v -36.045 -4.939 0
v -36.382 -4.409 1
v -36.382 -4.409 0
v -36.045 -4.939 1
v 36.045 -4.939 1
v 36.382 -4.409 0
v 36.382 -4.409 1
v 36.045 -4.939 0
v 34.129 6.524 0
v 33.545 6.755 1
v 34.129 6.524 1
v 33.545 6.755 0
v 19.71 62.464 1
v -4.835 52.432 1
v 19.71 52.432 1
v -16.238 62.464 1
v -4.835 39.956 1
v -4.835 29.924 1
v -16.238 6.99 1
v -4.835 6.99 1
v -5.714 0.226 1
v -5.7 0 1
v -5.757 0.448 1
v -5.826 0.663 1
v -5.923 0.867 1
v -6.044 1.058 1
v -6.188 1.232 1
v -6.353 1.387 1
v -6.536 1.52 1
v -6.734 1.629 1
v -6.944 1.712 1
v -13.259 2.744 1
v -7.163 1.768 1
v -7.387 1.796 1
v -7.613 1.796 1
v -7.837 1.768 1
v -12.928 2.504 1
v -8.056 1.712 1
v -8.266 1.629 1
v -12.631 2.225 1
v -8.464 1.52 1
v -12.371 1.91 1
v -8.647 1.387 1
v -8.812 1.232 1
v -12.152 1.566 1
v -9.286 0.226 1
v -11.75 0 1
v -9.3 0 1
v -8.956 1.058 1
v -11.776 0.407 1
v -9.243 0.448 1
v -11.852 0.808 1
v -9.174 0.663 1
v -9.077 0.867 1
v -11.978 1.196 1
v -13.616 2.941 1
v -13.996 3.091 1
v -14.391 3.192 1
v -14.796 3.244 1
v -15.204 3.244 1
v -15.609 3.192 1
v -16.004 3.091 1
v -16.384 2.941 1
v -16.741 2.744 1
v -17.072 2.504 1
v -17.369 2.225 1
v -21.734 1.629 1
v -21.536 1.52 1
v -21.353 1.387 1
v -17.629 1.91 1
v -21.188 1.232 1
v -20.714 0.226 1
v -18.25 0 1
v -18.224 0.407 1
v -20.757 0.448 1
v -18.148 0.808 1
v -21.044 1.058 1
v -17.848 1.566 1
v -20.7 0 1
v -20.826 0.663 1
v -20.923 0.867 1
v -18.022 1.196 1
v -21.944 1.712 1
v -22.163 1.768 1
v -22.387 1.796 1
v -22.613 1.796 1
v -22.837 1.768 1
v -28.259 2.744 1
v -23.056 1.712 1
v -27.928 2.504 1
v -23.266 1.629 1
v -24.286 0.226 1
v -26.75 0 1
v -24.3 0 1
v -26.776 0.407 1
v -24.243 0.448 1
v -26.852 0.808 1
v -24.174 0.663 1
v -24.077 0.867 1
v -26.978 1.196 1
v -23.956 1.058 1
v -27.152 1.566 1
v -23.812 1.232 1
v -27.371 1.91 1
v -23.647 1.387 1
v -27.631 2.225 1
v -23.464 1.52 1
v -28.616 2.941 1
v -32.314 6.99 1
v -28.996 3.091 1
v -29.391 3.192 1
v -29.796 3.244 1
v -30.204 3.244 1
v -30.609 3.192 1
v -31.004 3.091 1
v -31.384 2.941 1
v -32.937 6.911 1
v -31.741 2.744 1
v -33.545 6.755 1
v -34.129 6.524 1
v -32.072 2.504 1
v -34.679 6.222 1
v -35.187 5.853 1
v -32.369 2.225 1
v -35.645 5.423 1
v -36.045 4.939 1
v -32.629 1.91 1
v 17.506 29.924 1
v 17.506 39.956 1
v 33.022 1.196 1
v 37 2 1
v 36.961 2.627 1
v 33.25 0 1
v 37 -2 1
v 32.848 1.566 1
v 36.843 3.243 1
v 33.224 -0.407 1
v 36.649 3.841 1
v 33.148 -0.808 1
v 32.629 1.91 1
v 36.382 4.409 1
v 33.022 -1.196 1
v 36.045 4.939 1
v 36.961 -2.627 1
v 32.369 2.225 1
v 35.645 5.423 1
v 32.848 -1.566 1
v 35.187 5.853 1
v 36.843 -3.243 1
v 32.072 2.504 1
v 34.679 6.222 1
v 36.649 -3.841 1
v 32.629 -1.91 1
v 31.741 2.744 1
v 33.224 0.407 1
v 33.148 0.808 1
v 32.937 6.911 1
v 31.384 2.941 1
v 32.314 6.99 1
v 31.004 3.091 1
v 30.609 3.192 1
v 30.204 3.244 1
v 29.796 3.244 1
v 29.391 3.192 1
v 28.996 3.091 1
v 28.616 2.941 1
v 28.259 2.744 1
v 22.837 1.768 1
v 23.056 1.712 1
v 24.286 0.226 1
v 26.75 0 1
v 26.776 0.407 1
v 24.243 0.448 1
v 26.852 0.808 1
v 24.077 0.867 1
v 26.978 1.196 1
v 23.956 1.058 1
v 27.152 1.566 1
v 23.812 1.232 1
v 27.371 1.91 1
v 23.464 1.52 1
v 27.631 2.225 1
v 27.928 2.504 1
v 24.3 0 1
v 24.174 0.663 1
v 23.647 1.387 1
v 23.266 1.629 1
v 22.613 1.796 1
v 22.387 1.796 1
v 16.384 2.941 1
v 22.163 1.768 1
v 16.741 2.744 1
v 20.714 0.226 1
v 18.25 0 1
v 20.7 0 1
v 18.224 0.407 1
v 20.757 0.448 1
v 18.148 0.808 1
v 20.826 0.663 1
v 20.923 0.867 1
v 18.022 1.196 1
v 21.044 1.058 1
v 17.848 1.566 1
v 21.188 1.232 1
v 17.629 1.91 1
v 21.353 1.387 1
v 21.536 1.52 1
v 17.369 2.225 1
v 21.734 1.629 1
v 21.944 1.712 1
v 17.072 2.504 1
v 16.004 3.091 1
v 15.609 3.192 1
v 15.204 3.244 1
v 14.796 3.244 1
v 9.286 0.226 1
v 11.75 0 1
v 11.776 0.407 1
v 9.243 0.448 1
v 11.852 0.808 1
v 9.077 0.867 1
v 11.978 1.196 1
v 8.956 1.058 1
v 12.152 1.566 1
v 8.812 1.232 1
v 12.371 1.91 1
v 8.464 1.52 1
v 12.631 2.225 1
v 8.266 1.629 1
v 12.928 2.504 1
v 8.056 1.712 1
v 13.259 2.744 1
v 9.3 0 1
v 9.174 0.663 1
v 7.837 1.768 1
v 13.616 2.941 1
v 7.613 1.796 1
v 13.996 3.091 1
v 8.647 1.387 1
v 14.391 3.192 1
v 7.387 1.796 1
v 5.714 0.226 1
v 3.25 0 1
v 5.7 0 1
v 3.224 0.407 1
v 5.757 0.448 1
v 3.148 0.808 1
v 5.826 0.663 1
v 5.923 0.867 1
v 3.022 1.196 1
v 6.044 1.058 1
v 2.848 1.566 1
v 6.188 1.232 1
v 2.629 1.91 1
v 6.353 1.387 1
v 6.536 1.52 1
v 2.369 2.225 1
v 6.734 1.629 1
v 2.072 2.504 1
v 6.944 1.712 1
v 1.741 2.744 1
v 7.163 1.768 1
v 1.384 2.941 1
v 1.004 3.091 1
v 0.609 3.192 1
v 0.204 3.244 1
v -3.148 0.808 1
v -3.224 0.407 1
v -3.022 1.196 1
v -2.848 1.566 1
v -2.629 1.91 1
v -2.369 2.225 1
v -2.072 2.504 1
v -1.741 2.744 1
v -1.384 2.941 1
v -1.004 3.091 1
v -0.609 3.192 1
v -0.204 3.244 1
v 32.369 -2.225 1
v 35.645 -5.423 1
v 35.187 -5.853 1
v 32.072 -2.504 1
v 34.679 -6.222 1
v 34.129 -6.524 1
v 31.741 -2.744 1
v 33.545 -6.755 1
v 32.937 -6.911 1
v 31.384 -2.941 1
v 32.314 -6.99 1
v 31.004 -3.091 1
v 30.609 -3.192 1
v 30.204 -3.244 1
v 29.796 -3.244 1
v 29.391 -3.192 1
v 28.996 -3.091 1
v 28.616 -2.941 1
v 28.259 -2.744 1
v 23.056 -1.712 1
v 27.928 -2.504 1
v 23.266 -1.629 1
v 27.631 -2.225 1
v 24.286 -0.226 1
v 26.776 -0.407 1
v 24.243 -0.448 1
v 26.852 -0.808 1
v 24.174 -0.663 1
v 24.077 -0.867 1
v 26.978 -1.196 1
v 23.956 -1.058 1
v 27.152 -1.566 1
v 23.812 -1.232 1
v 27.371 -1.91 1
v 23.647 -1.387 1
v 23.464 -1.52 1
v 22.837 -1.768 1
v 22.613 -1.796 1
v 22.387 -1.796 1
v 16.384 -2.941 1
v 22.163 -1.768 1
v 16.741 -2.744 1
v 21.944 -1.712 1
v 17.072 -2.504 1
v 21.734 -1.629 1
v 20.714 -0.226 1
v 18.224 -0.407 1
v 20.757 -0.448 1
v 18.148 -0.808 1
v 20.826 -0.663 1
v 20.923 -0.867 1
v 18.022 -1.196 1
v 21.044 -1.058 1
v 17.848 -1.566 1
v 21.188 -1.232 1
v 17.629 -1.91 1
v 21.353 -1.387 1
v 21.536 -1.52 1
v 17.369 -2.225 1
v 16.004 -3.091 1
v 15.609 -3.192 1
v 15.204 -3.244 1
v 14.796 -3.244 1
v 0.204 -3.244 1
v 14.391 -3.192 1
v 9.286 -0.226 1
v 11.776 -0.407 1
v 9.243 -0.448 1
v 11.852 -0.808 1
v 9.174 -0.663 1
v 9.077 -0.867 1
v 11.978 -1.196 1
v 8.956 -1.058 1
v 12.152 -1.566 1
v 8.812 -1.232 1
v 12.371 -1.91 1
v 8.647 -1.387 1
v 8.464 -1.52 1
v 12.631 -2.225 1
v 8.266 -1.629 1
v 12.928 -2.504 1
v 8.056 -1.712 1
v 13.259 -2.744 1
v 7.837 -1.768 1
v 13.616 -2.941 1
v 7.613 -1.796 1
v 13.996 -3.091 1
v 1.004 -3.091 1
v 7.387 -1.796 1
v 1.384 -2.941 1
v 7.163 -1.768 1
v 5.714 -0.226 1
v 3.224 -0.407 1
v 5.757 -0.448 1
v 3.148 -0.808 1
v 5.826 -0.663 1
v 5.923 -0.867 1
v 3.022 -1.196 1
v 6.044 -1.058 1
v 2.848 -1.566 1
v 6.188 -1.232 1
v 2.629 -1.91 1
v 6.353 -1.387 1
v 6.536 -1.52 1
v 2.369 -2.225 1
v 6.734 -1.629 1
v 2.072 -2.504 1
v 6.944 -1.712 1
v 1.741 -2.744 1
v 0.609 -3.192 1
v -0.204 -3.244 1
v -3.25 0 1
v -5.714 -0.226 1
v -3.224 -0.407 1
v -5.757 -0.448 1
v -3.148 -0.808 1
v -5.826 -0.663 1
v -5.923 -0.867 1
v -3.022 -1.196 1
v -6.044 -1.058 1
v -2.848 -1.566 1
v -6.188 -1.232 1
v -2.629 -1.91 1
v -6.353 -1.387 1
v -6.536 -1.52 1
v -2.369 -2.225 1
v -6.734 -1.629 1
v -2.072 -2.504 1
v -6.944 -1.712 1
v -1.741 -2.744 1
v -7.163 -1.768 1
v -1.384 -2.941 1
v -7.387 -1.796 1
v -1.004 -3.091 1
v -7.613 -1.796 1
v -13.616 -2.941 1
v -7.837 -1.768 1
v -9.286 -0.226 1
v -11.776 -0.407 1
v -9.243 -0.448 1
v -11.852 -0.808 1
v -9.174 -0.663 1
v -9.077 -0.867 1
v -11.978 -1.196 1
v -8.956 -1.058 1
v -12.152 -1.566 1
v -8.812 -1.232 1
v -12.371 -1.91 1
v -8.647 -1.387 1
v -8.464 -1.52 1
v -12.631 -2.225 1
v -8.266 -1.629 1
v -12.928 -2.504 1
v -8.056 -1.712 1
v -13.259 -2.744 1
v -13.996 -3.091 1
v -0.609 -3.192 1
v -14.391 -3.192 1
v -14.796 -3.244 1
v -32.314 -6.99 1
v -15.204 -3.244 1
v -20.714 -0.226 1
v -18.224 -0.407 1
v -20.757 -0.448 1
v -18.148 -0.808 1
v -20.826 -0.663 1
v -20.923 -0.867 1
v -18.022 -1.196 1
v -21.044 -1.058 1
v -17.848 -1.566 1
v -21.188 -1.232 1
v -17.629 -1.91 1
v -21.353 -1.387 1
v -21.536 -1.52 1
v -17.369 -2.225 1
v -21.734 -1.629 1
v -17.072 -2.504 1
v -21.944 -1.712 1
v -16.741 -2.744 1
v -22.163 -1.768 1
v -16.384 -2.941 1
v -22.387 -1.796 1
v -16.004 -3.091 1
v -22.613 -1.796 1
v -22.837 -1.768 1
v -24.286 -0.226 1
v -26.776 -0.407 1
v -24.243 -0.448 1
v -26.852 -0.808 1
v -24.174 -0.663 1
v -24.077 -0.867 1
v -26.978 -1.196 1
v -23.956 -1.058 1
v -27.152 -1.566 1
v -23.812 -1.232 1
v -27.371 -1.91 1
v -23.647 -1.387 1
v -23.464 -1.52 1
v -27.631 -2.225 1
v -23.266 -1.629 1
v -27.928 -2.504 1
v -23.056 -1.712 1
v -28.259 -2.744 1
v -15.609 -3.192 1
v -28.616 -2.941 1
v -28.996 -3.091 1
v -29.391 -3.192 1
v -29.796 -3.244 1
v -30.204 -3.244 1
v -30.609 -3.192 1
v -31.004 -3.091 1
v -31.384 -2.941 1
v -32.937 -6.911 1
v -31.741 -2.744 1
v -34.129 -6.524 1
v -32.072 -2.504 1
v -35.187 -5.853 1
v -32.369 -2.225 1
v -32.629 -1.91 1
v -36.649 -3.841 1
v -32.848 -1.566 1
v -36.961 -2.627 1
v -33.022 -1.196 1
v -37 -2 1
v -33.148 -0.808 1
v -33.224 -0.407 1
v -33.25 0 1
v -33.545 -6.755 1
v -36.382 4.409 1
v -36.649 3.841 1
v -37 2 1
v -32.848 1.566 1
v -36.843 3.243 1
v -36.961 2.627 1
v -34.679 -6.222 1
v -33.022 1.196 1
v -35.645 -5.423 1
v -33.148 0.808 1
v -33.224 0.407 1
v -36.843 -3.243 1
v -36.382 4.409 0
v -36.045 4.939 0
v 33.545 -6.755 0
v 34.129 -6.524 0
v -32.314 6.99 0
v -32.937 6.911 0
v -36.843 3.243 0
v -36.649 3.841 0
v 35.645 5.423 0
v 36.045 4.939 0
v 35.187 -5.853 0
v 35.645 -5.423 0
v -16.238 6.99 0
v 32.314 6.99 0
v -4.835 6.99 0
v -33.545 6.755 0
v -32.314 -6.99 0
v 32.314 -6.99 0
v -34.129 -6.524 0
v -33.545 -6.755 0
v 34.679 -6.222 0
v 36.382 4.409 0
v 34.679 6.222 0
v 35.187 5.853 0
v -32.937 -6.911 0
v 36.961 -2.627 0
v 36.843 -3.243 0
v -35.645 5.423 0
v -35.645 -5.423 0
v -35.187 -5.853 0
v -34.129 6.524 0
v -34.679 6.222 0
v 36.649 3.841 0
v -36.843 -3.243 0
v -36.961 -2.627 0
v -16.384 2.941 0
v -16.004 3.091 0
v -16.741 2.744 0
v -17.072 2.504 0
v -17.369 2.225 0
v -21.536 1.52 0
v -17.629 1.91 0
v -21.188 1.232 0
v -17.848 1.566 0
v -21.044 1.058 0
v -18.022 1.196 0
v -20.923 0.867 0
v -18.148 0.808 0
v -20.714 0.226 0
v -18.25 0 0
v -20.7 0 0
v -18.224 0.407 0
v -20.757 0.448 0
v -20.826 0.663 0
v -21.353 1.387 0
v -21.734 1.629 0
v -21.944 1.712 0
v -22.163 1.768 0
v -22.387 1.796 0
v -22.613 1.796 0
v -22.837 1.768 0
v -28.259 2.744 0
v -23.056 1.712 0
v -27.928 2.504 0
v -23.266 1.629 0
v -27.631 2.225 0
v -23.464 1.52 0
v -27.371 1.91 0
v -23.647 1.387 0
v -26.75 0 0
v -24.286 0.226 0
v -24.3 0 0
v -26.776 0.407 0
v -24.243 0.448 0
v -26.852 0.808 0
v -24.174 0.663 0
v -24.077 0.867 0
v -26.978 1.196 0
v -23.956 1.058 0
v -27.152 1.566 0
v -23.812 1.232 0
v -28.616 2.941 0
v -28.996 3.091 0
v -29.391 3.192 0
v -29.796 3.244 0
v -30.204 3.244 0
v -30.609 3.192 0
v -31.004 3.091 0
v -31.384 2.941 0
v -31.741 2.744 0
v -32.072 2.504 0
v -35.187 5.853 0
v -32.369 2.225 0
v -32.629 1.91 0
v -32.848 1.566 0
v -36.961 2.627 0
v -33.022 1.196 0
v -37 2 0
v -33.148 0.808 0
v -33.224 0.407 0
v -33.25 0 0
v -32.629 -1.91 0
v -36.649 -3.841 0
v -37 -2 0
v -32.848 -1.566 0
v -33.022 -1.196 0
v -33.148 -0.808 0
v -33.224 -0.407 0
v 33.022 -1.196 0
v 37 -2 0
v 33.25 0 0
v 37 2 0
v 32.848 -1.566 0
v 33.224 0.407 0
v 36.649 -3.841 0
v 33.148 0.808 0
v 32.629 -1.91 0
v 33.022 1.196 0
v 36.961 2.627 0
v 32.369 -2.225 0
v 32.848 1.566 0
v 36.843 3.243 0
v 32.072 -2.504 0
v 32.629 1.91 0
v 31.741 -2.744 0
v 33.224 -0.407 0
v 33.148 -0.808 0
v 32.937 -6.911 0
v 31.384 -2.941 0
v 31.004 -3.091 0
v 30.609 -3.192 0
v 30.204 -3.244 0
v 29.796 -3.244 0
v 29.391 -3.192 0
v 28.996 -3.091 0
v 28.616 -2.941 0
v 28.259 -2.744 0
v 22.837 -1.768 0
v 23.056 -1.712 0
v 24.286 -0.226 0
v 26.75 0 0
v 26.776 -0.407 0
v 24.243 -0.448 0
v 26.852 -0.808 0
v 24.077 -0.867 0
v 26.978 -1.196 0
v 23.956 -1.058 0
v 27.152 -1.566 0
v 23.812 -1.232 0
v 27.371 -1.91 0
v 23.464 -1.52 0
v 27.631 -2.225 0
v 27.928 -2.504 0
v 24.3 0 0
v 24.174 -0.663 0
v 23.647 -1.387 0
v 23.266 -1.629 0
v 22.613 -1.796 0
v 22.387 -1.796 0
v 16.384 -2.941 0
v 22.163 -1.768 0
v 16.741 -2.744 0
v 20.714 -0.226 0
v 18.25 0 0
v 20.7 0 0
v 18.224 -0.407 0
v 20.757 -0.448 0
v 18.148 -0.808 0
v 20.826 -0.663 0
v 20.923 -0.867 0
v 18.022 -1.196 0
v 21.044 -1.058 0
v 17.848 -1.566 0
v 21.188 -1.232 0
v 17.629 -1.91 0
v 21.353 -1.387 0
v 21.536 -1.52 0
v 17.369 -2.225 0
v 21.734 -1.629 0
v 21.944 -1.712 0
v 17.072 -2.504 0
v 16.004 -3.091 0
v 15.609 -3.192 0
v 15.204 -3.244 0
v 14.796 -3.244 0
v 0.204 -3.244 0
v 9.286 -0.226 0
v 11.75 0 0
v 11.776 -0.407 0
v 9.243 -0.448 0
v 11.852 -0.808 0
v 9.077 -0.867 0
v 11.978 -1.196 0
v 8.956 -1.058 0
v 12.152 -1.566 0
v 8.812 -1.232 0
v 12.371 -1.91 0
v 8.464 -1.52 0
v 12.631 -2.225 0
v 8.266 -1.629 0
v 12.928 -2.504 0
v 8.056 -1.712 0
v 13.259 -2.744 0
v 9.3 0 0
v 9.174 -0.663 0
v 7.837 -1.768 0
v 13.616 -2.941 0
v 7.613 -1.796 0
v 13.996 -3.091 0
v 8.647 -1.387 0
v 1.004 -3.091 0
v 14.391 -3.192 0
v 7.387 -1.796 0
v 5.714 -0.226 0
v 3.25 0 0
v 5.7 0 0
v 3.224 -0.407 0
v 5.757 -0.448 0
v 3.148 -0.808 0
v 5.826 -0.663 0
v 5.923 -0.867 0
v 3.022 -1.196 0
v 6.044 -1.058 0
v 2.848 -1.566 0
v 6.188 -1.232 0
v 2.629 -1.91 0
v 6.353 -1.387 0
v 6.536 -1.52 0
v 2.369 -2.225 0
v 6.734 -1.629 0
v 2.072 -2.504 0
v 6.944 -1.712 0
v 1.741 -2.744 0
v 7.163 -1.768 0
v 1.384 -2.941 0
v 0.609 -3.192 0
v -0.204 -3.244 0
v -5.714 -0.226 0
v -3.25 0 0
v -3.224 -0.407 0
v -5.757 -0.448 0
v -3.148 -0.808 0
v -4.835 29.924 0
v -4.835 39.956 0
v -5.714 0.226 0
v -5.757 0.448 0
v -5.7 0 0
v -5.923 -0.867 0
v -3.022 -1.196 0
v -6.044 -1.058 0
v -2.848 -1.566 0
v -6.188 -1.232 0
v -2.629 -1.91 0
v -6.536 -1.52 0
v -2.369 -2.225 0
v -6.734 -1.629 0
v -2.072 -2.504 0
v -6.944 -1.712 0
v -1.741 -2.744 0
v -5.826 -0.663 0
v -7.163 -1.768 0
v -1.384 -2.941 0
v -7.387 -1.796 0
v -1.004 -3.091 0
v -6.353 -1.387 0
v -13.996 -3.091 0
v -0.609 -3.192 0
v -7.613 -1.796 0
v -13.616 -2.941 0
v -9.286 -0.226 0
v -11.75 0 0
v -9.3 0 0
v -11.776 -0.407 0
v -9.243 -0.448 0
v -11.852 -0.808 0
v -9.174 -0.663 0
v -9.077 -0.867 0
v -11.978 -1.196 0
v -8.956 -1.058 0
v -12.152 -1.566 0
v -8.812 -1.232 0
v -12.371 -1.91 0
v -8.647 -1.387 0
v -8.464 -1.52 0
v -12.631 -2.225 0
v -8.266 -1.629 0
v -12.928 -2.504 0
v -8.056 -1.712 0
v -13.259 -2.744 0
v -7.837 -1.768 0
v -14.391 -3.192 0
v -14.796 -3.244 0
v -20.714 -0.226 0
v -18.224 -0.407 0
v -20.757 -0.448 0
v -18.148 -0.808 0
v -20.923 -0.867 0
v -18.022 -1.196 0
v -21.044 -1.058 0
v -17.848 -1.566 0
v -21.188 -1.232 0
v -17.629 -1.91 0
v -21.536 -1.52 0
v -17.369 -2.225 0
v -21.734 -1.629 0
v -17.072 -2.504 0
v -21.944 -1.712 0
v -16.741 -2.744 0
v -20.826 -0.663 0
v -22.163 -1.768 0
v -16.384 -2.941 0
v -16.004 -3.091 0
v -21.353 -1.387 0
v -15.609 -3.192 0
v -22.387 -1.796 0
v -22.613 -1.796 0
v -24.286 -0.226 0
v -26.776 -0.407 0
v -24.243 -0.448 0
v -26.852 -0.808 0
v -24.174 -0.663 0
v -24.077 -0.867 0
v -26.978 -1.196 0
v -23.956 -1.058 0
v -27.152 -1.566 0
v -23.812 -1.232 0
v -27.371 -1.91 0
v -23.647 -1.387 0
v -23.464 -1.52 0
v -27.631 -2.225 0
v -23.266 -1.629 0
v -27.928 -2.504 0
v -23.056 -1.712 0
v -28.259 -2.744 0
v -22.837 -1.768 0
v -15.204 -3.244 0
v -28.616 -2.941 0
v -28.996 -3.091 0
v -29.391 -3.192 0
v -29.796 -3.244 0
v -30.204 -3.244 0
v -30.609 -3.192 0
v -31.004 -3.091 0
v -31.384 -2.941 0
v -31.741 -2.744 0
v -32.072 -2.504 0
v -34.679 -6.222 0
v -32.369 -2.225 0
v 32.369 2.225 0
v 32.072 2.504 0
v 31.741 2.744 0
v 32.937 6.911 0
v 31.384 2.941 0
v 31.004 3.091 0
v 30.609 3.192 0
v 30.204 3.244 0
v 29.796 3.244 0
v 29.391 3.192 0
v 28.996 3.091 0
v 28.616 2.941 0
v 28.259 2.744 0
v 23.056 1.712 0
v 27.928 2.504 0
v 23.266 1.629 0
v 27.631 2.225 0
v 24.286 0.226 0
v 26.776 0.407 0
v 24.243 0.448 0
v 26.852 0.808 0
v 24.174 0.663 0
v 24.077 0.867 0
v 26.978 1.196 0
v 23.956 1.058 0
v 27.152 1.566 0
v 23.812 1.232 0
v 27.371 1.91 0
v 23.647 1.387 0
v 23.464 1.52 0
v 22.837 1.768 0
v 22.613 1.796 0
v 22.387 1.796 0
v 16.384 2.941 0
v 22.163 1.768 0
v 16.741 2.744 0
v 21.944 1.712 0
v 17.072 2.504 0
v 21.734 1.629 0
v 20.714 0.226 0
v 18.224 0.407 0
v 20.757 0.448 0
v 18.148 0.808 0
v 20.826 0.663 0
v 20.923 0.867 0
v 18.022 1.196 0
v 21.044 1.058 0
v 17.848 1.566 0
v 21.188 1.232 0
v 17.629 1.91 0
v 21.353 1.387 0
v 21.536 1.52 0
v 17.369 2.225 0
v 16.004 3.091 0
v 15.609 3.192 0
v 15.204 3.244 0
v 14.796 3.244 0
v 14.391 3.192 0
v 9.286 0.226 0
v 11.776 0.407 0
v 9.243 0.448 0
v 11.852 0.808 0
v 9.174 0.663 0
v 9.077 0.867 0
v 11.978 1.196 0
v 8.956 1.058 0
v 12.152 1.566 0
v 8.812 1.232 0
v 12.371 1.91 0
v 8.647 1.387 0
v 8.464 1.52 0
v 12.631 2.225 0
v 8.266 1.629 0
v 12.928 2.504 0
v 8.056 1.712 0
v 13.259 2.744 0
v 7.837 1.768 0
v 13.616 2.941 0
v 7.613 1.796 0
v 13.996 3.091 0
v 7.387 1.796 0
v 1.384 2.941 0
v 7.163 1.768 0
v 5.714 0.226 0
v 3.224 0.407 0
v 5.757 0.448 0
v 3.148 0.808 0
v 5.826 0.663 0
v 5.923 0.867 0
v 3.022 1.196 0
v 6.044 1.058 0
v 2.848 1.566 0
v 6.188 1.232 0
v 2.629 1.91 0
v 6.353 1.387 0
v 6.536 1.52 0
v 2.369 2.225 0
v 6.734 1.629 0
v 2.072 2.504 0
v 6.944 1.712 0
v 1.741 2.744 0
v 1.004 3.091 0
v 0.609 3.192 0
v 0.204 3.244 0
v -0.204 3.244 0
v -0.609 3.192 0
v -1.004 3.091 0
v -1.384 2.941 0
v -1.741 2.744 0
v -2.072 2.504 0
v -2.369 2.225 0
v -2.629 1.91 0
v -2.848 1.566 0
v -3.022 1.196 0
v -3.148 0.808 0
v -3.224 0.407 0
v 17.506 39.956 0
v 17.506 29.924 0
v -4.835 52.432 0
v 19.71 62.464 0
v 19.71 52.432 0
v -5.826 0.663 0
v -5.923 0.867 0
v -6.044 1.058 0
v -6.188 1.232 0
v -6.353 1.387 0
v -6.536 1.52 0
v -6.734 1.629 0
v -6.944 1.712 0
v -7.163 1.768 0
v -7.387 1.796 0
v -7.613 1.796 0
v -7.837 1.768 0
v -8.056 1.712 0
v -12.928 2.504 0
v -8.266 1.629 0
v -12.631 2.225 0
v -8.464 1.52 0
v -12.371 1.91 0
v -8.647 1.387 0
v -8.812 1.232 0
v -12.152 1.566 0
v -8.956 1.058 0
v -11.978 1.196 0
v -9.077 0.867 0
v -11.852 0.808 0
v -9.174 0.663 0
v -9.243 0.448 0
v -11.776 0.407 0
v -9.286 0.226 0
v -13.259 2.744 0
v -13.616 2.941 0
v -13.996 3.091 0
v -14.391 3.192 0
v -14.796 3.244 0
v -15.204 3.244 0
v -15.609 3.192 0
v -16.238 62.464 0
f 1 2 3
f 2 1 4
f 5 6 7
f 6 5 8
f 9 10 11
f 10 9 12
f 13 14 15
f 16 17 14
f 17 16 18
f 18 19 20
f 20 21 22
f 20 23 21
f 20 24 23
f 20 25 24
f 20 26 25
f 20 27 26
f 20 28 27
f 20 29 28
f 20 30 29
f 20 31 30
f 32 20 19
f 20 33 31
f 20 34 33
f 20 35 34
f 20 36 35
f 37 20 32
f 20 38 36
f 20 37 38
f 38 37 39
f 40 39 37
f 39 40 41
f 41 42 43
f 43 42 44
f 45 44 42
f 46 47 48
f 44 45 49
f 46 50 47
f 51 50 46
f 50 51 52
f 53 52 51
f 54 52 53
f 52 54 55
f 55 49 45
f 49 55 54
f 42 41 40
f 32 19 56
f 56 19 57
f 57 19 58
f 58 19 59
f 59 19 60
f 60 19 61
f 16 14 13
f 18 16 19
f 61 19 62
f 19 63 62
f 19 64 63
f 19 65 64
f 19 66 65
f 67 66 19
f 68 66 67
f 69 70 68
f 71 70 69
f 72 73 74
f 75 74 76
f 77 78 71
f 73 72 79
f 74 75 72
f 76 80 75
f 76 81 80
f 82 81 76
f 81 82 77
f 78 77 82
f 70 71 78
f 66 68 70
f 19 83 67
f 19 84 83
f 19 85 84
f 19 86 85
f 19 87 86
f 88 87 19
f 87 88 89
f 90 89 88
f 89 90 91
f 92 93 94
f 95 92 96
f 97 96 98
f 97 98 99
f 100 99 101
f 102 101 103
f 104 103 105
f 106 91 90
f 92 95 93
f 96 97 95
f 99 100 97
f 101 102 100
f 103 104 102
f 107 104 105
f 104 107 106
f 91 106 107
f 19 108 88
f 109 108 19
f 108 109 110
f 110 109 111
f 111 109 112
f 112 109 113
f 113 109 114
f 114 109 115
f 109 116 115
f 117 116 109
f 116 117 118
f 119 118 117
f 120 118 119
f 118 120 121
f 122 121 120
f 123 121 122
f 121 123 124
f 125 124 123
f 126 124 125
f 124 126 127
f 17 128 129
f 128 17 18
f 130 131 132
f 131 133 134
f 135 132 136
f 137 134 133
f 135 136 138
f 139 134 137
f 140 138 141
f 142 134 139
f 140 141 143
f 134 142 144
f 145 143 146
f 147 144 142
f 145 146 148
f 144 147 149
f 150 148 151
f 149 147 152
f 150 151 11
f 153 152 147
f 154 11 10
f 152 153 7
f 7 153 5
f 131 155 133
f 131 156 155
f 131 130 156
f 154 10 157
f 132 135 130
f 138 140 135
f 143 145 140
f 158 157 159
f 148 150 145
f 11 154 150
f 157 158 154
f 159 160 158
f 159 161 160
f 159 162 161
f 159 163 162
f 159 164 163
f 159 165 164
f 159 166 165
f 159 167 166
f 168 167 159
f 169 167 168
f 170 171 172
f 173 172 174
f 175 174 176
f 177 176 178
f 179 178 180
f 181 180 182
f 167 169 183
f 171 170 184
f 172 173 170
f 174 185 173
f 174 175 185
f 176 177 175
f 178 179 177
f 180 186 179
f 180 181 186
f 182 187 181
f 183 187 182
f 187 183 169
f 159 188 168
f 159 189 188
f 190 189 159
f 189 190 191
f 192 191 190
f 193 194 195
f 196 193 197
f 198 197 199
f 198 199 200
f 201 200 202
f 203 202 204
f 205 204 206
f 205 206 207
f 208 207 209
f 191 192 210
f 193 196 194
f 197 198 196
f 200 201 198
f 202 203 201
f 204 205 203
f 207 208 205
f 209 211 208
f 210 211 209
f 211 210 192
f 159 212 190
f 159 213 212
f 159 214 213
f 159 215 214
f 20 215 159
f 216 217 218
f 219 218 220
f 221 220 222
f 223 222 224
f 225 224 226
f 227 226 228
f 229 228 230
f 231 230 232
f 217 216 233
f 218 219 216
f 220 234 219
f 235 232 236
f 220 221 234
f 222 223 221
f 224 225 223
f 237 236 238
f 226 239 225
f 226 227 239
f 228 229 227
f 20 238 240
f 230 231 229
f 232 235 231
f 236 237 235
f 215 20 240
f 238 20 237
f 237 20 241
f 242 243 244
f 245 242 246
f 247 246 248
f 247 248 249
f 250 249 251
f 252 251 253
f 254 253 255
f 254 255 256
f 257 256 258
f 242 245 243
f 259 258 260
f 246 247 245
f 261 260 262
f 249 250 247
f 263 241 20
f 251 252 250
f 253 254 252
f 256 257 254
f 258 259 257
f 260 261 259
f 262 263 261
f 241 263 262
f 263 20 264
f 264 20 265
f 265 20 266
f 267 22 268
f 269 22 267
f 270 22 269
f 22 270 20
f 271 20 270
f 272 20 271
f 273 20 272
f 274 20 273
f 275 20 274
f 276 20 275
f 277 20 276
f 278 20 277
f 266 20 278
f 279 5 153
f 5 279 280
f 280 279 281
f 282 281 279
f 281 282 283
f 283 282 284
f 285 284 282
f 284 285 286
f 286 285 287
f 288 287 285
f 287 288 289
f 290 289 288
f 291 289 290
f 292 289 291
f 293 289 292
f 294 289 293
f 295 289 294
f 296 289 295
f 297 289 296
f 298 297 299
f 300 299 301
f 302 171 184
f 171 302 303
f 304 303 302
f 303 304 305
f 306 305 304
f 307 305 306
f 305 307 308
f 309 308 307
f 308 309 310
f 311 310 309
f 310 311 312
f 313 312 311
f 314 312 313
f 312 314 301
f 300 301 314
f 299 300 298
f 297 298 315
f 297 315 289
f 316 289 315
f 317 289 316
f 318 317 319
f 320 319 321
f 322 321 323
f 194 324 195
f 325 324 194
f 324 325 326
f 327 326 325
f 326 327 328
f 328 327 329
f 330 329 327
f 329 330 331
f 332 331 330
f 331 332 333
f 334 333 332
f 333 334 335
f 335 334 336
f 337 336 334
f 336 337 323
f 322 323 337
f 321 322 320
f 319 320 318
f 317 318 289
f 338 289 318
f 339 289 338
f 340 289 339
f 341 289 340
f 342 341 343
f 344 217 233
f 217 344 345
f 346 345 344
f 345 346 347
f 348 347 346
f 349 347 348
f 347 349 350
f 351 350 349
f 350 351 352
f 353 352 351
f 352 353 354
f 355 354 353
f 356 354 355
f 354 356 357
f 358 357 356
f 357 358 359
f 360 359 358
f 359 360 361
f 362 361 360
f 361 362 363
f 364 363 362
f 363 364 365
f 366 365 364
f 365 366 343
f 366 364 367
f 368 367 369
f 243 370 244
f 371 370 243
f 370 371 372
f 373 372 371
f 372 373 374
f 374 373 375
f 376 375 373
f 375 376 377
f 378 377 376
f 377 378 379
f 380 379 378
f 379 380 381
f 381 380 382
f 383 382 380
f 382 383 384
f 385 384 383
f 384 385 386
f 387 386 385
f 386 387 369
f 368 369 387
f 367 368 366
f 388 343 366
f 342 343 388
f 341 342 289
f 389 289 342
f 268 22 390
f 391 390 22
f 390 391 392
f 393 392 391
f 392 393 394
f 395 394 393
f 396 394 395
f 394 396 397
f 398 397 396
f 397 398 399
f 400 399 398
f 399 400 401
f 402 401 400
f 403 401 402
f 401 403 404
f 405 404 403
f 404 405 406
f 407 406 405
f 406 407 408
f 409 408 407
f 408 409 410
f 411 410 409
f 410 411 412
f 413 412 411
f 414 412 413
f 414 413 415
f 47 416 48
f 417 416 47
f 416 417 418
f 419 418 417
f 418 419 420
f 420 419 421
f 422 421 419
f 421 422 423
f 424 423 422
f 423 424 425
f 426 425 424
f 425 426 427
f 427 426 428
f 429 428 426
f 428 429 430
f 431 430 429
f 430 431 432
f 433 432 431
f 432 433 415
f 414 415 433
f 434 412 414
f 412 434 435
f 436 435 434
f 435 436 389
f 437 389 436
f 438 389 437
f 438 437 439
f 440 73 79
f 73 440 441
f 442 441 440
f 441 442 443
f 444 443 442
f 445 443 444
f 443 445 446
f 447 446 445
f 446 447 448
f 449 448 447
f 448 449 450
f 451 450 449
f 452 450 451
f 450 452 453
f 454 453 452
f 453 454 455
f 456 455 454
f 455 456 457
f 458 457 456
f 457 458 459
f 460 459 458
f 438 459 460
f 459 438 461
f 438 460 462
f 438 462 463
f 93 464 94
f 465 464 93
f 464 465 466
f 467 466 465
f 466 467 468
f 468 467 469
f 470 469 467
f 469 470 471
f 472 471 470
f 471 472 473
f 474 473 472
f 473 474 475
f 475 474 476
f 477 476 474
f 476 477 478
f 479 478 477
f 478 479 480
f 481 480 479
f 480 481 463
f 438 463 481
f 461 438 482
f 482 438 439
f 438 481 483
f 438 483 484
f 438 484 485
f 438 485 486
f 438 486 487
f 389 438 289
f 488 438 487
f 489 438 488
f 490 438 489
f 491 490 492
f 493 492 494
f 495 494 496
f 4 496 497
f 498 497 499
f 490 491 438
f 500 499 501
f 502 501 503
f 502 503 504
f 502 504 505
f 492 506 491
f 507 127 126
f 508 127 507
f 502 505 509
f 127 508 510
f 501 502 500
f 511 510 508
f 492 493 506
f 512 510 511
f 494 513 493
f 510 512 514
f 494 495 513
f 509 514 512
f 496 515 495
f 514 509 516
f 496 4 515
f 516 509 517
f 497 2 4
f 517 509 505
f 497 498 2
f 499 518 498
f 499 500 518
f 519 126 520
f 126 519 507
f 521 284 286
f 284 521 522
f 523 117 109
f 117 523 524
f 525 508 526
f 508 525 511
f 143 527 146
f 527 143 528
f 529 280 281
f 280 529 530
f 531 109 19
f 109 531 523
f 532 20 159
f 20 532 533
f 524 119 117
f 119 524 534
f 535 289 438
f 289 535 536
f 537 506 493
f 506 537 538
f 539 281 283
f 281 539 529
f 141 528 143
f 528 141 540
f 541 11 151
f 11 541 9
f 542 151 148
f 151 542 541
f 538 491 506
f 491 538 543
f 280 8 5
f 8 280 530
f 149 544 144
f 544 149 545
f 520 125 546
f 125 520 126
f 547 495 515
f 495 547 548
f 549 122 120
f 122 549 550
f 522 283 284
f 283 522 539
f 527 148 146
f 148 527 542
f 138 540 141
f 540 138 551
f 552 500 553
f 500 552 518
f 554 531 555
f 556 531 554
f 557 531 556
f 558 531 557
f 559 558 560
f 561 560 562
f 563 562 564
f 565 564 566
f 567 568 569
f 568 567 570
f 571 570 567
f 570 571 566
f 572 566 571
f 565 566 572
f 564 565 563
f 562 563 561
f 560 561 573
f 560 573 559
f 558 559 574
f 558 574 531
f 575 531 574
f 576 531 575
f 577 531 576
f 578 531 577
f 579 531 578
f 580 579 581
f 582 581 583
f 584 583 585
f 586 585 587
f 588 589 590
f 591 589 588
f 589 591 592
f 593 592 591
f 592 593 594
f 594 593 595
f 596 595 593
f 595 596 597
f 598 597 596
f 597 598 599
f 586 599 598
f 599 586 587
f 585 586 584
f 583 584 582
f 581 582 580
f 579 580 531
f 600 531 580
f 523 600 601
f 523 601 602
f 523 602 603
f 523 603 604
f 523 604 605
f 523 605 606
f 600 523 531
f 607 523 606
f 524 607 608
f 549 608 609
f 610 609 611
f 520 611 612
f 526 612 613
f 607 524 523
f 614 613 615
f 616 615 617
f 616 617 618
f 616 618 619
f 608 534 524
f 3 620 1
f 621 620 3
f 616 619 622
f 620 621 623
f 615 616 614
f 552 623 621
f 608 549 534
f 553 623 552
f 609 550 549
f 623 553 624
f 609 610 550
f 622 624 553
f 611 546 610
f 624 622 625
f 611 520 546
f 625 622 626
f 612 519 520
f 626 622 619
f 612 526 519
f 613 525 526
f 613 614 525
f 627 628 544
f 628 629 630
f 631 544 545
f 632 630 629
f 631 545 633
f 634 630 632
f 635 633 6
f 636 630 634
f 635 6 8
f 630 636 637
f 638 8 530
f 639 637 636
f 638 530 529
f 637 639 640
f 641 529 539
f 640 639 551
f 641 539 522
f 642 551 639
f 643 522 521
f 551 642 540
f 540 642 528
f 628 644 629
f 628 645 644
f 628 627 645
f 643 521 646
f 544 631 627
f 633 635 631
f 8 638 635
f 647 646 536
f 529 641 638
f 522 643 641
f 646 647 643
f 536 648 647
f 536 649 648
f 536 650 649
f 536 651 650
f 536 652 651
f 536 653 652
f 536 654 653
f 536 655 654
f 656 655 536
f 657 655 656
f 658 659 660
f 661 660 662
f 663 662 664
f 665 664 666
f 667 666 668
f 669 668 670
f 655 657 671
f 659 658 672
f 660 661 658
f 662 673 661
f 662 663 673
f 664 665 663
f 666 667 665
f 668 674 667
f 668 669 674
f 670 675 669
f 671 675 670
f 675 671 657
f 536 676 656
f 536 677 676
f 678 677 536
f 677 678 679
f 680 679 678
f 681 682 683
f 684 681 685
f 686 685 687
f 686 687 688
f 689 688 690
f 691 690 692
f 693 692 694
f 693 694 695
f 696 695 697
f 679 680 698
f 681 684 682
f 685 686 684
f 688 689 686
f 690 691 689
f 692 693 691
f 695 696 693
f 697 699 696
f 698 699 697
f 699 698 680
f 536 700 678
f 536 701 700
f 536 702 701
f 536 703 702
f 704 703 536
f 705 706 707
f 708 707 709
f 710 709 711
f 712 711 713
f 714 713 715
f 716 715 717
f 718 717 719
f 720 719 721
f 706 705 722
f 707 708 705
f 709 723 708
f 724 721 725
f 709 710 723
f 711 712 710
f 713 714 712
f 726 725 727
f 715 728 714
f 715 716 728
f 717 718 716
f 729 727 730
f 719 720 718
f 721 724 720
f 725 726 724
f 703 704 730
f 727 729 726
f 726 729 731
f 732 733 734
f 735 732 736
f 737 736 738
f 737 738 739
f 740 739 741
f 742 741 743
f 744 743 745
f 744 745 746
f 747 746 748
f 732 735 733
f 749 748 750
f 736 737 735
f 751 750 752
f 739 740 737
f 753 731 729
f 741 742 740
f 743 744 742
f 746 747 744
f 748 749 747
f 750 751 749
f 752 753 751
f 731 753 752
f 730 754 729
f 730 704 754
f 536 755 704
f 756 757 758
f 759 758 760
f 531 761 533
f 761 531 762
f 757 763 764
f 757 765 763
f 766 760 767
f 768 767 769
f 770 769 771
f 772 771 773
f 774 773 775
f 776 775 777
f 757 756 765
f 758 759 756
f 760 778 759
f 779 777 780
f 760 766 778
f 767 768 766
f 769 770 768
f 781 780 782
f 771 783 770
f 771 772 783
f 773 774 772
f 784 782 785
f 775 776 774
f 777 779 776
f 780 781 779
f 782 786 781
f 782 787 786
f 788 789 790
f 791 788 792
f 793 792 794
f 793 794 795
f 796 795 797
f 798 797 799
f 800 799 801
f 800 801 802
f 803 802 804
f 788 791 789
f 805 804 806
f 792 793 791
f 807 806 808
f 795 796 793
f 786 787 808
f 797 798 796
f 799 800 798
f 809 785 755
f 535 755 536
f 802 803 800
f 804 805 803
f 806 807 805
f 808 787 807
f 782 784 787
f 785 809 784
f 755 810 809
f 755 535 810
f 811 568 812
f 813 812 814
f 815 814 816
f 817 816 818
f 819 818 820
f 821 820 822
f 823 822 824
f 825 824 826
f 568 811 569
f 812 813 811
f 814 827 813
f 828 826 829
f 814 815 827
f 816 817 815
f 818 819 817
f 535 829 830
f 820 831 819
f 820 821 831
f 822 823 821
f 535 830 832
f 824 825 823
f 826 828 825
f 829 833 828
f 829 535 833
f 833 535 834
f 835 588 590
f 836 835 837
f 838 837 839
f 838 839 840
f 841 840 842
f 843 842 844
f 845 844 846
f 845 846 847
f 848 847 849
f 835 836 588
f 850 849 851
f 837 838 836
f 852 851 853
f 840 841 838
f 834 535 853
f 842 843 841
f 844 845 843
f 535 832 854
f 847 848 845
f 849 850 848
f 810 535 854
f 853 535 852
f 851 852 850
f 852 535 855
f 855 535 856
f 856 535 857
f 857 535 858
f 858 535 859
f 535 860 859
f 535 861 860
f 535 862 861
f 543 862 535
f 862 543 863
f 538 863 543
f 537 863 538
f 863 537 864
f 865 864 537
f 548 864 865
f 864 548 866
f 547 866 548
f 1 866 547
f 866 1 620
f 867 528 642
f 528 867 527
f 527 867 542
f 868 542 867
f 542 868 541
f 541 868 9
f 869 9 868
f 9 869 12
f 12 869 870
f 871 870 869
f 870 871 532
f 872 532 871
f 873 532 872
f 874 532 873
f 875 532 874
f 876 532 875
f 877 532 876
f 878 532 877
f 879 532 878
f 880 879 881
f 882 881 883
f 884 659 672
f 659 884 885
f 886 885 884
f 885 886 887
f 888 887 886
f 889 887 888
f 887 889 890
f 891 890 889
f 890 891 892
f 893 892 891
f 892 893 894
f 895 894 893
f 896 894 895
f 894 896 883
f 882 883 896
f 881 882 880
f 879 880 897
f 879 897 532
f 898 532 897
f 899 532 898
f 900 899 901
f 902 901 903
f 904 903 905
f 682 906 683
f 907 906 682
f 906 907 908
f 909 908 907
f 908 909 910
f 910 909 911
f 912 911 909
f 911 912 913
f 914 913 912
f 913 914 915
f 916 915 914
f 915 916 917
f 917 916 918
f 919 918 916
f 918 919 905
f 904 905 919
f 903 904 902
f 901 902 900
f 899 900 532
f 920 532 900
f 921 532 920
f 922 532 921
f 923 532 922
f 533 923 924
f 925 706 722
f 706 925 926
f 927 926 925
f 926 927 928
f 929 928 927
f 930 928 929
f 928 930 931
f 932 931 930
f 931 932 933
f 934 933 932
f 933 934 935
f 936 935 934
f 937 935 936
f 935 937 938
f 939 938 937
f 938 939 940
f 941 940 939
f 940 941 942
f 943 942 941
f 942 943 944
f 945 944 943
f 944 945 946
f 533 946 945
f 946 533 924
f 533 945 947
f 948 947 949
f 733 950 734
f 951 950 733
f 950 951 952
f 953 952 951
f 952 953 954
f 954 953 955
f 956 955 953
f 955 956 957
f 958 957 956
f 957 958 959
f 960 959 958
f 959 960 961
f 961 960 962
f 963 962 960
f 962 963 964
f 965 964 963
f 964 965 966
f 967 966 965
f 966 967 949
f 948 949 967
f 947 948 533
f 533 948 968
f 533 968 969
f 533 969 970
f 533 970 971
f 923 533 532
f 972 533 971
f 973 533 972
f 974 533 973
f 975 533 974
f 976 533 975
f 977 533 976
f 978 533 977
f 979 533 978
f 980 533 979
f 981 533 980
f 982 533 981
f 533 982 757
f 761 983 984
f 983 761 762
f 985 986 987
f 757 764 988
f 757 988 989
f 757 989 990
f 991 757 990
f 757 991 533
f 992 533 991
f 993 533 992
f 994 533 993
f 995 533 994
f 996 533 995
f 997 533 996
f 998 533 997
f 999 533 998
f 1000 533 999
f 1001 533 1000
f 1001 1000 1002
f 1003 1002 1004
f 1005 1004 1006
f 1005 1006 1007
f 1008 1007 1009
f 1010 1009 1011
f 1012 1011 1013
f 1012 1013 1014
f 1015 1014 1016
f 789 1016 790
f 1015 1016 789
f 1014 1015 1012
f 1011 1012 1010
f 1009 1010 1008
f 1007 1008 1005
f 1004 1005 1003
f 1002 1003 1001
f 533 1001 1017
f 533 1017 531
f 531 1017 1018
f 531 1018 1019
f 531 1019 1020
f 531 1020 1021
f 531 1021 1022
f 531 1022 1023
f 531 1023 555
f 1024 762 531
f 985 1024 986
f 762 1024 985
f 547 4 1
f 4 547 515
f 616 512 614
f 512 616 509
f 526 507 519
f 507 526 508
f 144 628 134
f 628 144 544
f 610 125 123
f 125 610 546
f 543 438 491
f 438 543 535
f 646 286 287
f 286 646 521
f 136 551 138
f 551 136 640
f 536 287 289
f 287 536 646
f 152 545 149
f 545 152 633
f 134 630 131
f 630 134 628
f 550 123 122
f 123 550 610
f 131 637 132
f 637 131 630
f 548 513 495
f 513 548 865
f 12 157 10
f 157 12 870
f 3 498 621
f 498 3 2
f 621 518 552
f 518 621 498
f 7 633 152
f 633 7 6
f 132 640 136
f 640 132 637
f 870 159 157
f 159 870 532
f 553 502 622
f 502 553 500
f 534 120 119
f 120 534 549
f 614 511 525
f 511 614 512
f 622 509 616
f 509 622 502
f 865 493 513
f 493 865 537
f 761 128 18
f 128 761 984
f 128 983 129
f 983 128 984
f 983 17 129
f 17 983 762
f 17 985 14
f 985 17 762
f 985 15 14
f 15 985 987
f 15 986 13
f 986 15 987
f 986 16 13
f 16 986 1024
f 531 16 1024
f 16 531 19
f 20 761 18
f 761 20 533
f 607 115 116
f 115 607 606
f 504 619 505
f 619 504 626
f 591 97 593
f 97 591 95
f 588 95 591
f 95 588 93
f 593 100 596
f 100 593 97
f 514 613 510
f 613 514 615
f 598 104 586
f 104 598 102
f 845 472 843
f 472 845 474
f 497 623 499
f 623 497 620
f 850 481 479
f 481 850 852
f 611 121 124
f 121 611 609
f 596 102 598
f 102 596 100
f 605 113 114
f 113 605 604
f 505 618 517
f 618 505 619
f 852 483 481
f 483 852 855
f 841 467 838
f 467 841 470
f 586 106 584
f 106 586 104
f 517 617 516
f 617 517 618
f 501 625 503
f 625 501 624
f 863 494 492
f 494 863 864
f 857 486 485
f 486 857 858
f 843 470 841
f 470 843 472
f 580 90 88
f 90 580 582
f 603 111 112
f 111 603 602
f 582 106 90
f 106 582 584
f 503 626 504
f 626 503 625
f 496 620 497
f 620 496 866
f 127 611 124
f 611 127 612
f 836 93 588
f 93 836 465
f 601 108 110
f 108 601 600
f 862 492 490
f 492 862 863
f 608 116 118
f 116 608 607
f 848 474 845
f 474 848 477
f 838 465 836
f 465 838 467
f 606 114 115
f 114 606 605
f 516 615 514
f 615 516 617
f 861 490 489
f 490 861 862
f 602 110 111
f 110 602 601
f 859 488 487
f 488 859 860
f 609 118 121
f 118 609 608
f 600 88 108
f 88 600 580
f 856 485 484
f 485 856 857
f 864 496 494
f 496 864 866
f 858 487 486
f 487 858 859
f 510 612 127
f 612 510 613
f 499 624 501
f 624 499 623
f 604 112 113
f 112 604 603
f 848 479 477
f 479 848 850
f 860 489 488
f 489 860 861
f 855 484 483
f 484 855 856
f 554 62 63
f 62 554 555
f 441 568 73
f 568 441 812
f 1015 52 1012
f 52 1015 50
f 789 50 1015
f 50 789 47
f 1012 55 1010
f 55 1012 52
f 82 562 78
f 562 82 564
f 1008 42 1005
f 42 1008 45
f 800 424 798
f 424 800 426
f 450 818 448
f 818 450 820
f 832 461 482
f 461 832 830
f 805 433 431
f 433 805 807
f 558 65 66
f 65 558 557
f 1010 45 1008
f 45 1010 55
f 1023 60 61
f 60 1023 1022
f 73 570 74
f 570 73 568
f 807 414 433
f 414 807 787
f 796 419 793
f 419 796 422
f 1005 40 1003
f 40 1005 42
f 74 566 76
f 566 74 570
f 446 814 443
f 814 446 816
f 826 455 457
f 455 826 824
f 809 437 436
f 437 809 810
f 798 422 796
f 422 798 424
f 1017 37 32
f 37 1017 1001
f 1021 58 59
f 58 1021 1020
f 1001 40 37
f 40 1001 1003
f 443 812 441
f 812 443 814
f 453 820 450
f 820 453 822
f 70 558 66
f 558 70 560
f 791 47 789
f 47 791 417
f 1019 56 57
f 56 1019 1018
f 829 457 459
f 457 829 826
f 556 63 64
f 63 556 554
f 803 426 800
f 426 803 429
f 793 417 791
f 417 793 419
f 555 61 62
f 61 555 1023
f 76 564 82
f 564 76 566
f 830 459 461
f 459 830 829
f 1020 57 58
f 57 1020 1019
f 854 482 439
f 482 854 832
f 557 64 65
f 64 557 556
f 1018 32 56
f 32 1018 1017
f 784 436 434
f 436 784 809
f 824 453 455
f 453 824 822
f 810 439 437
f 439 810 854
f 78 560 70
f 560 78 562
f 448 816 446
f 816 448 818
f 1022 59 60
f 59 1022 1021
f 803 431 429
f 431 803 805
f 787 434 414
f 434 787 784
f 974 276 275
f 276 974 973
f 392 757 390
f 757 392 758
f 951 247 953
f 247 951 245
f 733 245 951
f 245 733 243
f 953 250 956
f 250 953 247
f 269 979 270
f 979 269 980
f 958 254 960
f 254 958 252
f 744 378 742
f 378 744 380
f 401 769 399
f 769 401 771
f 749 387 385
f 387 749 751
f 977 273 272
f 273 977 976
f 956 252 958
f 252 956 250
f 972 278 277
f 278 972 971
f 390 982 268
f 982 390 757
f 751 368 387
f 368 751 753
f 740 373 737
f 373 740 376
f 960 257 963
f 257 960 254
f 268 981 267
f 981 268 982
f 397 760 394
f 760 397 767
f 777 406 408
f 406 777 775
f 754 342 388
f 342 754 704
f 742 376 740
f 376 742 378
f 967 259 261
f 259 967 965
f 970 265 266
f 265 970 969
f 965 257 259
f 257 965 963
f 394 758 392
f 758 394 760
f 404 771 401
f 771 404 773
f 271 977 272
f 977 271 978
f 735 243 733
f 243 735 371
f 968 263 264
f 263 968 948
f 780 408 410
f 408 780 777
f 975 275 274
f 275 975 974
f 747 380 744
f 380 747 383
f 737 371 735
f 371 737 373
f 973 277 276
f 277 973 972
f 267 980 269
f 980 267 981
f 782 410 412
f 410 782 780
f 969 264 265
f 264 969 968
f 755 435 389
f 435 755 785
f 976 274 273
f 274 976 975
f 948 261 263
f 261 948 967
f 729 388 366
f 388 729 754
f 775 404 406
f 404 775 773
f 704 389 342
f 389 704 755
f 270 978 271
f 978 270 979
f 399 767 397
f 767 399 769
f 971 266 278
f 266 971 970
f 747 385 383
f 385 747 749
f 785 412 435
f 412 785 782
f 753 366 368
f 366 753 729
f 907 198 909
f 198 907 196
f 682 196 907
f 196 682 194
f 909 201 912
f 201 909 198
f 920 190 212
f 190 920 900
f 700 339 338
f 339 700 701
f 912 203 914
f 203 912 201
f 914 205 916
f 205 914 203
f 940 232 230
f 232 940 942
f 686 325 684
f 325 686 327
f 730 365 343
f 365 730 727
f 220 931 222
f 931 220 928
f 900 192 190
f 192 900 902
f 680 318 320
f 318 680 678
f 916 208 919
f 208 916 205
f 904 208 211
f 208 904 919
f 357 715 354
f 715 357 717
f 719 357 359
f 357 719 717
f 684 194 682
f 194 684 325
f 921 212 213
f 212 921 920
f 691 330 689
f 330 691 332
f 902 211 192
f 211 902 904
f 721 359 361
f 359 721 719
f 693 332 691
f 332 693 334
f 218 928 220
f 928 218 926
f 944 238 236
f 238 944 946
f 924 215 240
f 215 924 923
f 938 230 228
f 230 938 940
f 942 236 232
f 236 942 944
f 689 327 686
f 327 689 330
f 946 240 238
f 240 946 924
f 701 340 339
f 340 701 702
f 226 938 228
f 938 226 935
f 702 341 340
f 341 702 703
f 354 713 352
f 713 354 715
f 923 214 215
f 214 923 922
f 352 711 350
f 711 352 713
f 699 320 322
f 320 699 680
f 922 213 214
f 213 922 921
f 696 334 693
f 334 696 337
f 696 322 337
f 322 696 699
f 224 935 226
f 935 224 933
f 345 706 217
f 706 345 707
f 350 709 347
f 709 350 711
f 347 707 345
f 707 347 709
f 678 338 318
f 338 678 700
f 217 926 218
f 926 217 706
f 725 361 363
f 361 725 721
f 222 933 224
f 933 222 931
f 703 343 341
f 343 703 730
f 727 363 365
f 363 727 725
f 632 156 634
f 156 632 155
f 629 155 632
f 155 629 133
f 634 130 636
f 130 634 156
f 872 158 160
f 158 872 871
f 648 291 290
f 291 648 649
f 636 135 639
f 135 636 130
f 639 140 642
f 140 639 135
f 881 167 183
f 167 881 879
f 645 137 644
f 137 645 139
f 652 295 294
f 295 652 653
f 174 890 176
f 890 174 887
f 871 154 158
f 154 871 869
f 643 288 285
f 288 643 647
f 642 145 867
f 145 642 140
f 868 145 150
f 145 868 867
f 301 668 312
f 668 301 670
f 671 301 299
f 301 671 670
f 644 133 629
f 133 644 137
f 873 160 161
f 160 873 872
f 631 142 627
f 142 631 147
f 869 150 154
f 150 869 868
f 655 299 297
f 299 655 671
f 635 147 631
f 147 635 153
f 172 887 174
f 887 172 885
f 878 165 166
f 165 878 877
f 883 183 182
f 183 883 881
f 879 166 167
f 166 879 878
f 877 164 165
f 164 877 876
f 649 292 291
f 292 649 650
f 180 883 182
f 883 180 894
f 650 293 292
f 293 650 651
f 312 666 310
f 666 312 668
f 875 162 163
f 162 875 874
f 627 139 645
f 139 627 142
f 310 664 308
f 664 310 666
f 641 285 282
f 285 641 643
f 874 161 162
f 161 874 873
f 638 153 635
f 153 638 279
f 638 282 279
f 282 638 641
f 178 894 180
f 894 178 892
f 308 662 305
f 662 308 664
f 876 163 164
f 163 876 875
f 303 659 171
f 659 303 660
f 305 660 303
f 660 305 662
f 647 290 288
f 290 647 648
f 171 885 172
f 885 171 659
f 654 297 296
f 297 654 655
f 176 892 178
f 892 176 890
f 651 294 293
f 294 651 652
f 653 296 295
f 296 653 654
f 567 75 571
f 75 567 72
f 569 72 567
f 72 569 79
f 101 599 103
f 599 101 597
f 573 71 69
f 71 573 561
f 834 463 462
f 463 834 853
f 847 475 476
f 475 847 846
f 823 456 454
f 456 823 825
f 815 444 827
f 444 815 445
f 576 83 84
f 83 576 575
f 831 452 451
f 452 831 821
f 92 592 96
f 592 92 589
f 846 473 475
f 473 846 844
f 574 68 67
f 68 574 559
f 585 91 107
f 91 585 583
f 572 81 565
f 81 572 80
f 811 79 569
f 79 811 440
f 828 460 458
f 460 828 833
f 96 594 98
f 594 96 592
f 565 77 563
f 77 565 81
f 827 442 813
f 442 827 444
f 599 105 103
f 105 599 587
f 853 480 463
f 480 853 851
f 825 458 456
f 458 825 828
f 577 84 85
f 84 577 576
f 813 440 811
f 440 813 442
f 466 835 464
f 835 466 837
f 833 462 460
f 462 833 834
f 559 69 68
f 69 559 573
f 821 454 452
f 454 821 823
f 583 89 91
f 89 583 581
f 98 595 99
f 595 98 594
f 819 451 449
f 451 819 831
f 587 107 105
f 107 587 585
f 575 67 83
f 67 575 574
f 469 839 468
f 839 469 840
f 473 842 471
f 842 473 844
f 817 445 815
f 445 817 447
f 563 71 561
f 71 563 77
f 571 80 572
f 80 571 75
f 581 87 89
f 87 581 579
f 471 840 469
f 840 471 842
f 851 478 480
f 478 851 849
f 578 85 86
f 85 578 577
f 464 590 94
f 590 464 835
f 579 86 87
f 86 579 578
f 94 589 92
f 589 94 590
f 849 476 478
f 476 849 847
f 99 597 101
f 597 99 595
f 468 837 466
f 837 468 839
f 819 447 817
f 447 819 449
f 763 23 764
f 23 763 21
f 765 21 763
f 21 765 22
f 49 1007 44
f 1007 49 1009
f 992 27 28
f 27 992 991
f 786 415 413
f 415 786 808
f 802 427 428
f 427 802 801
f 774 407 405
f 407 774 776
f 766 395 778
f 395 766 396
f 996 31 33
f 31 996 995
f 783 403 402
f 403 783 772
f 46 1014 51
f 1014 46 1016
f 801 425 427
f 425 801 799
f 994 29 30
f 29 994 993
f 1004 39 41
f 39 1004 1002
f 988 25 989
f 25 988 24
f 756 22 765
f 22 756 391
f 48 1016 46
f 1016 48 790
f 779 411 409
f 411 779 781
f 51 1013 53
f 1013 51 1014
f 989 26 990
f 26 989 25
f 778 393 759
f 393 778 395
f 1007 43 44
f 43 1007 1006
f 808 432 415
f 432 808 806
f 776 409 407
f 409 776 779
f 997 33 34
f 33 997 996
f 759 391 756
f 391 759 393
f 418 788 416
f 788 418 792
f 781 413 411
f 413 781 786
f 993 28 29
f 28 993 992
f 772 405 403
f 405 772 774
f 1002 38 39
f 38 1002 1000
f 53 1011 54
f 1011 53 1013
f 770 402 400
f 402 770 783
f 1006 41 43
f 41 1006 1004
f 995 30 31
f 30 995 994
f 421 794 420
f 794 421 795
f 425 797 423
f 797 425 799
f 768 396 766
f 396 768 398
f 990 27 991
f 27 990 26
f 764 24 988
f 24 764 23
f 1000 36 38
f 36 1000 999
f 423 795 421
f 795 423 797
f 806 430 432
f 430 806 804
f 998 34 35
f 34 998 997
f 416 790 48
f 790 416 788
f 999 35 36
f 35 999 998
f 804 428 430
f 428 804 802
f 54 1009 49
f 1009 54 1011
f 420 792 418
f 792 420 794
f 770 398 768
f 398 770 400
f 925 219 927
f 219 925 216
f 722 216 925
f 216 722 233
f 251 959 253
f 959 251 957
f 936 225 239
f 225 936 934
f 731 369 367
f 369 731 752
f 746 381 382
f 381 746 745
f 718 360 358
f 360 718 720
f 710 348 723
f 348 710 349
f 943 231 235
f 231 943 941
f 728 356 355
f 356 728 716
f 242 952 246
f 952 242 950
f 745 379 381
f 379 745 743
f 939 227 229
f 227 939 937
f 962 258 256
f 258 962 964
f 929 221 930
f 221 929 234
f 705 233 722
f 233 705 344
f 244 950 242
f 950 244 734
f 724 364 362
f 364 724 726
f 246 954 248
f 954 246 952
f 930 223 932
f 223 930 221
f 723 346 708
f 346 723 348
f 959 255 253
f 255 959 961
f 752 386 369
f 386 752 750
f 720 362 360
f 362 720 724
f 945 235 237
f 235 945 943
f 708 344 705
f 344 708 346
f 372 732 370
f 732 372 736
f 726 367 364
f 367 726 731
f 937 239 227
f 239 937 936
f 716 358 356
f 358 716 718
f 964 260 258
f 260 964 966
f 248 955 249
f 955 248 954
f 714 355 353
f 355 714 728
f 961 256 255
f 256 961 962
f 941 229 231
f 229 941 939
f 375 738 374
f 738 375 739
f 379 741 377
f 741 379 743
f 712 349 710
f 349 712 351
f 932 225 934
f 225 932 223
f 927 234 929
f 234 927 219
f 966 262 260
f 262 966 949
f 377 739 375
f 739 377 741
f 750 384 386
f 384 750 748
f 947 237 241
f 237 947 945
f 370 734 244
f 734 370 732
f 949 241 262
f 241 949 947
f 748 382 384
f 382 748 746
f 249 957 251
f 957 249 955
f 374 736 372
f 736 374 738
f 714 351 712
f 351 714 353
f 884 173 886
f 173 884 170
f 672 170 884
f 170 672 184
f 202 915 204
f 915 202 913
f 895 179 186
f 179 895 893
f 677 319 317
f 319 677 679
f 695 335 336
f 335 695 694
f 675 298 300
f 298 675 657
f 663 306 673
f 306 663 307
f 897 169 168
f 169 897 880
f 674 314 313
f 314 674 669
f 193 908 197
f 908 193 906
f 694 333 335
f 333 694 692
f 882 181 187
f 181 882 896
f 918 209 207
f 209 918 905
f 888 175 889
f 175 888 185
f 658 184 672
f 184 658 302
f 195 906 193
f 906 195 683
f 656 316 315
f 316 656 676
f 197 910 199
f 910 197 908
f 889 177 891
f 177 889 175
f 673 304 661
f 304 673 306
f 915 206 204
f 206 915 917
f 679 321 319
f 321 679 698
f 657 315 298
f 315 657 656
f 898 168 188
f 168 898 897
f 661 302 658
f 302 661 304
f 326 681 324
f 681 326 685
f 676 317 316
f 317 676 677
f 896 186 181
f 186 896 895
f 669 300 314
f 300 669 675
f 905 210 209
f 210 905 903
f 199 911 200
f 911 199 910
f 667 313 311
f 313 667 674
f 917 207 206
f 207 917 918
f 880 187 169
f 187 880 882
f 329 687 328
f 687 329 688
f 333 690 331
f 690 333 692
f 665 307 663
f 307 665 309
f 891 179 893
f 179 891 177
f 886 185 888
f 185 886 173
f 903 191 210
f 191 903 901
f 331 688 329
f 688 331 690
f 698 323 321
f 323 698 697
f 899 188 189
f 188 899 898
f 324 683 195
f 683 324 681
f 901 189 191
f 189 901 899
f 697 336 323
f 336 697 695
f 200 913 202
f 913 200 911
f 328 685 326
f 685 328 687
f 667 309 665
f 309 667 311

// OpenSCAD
$fn = 50;


difference() {
	union() {
		hull() {
			translate(v = [-32.0000000000, 2.0000000000, 0]) {
				cylinder(h = 1, r = 5);
			}
			translate(v = [32.0000000000, 2.0000000000, 0]) {
				cylinder(h = 1, r = 5);
			}
			translate(v = [-32.0000000000, -2.0000000000, 0]) {
				cylinder(h = 1, r = 5);
			}
			translate(v = [32.0000000000, -2.0000000000, 0]) {
				cylinder(h = 1, r = 5);
			}
		}
		translate(v = [0, 61.1111111111, 0]) {
			linear_extrude(height = 1) {
				text(font = "DejaVu Sans Mono:style=Bold", halign = "center", size = 57.0000000000, text = "F", valign = "top");
			}
		}
	}
	union() {
		translate(v = [-30.0000000000, 0.0000000000, 0]) {
			translate(v = [0, 0, -100]) {
				cylinder(h = 200, r = 3.2500000000);
			}
		}
		translate(v = [-15.0000000000, 0.0000000000, 0]) {
			translate(v = [0, 0, -100]) {
				cylinder(h = 200, r = 3.2500000000);
			}
		}
		translate(v = [0, 0, -100]) {
			cylinder(h = 200, r = 3.2500000000);
		}
		translate(v = [15.0000000000, 0.0000000000, 0]) {
			translate(v = [0, 0, -100]) {
				cylinder(h = 200, r = 3.2500000000);
			}
		}
		translate(v = [30.0000000000, 0.0000000000, 0]) {
			translate(v = [0, 0, -100]) {
				cylinder(h = 200, r = 3.2500000000);
			}
		}
		translate(v = [-30.0000000000, 0.0000000000, 0]) {
			translate(v = [0, 0, -100]) {
				cylinder(h = 200, r = 1.8000000000);
			}
		}
		translate(v = [-22.5000000000, 0.0000000000, 0]) {
			translate(v = [0, 0, -100]) {
				cylinder(h = 200, r = 1.8000000000);
			}
		}
		translate(v = [-15.0000000000, 0.0000000000, 0]) {
			translate(v = [0, 0, -100]) {
				cylinder(h = 200, r = 1.8000000000);
			}
		}
		translate(v = [-7.5000000000, 0.0000000000, 0]) {
			translate(v = [0, 0, -100]) {
				cylinder(h = 200, r = 1.8000000000);
			}
		}
		translate(v = [0, 0, -100]) {
			cylinder(h = 200, r = 1.8000000000);
		}
		translate(v = [7.5000000000, 0.0000000000, 0]) {
			translate(v = [0, 0, -100]) {
				cylinder(h = 200, r = 1.8000000000);
			}
		}
		translate(v = [15.0000000000, 0.0000000000, 0]) {
			translate(v = [0, 0, -100]) {
				cylinder(h = 200, r = 1.8000000000);
			}
		}
		translate(v = [22.5000000000, 0.0000000000, 0]) {
			translate(v = [0, 0, -100]) {
				cylinder(h = 200, r = 1.8000000000);
			}
		}
		translate(v = [30.0000000000, 0.0000000000, 0]) {
			translate(v = [0, 0, -100]) {
				cylinder(h = 200, r = 1.8000000000);
			}
		}
	}
}
